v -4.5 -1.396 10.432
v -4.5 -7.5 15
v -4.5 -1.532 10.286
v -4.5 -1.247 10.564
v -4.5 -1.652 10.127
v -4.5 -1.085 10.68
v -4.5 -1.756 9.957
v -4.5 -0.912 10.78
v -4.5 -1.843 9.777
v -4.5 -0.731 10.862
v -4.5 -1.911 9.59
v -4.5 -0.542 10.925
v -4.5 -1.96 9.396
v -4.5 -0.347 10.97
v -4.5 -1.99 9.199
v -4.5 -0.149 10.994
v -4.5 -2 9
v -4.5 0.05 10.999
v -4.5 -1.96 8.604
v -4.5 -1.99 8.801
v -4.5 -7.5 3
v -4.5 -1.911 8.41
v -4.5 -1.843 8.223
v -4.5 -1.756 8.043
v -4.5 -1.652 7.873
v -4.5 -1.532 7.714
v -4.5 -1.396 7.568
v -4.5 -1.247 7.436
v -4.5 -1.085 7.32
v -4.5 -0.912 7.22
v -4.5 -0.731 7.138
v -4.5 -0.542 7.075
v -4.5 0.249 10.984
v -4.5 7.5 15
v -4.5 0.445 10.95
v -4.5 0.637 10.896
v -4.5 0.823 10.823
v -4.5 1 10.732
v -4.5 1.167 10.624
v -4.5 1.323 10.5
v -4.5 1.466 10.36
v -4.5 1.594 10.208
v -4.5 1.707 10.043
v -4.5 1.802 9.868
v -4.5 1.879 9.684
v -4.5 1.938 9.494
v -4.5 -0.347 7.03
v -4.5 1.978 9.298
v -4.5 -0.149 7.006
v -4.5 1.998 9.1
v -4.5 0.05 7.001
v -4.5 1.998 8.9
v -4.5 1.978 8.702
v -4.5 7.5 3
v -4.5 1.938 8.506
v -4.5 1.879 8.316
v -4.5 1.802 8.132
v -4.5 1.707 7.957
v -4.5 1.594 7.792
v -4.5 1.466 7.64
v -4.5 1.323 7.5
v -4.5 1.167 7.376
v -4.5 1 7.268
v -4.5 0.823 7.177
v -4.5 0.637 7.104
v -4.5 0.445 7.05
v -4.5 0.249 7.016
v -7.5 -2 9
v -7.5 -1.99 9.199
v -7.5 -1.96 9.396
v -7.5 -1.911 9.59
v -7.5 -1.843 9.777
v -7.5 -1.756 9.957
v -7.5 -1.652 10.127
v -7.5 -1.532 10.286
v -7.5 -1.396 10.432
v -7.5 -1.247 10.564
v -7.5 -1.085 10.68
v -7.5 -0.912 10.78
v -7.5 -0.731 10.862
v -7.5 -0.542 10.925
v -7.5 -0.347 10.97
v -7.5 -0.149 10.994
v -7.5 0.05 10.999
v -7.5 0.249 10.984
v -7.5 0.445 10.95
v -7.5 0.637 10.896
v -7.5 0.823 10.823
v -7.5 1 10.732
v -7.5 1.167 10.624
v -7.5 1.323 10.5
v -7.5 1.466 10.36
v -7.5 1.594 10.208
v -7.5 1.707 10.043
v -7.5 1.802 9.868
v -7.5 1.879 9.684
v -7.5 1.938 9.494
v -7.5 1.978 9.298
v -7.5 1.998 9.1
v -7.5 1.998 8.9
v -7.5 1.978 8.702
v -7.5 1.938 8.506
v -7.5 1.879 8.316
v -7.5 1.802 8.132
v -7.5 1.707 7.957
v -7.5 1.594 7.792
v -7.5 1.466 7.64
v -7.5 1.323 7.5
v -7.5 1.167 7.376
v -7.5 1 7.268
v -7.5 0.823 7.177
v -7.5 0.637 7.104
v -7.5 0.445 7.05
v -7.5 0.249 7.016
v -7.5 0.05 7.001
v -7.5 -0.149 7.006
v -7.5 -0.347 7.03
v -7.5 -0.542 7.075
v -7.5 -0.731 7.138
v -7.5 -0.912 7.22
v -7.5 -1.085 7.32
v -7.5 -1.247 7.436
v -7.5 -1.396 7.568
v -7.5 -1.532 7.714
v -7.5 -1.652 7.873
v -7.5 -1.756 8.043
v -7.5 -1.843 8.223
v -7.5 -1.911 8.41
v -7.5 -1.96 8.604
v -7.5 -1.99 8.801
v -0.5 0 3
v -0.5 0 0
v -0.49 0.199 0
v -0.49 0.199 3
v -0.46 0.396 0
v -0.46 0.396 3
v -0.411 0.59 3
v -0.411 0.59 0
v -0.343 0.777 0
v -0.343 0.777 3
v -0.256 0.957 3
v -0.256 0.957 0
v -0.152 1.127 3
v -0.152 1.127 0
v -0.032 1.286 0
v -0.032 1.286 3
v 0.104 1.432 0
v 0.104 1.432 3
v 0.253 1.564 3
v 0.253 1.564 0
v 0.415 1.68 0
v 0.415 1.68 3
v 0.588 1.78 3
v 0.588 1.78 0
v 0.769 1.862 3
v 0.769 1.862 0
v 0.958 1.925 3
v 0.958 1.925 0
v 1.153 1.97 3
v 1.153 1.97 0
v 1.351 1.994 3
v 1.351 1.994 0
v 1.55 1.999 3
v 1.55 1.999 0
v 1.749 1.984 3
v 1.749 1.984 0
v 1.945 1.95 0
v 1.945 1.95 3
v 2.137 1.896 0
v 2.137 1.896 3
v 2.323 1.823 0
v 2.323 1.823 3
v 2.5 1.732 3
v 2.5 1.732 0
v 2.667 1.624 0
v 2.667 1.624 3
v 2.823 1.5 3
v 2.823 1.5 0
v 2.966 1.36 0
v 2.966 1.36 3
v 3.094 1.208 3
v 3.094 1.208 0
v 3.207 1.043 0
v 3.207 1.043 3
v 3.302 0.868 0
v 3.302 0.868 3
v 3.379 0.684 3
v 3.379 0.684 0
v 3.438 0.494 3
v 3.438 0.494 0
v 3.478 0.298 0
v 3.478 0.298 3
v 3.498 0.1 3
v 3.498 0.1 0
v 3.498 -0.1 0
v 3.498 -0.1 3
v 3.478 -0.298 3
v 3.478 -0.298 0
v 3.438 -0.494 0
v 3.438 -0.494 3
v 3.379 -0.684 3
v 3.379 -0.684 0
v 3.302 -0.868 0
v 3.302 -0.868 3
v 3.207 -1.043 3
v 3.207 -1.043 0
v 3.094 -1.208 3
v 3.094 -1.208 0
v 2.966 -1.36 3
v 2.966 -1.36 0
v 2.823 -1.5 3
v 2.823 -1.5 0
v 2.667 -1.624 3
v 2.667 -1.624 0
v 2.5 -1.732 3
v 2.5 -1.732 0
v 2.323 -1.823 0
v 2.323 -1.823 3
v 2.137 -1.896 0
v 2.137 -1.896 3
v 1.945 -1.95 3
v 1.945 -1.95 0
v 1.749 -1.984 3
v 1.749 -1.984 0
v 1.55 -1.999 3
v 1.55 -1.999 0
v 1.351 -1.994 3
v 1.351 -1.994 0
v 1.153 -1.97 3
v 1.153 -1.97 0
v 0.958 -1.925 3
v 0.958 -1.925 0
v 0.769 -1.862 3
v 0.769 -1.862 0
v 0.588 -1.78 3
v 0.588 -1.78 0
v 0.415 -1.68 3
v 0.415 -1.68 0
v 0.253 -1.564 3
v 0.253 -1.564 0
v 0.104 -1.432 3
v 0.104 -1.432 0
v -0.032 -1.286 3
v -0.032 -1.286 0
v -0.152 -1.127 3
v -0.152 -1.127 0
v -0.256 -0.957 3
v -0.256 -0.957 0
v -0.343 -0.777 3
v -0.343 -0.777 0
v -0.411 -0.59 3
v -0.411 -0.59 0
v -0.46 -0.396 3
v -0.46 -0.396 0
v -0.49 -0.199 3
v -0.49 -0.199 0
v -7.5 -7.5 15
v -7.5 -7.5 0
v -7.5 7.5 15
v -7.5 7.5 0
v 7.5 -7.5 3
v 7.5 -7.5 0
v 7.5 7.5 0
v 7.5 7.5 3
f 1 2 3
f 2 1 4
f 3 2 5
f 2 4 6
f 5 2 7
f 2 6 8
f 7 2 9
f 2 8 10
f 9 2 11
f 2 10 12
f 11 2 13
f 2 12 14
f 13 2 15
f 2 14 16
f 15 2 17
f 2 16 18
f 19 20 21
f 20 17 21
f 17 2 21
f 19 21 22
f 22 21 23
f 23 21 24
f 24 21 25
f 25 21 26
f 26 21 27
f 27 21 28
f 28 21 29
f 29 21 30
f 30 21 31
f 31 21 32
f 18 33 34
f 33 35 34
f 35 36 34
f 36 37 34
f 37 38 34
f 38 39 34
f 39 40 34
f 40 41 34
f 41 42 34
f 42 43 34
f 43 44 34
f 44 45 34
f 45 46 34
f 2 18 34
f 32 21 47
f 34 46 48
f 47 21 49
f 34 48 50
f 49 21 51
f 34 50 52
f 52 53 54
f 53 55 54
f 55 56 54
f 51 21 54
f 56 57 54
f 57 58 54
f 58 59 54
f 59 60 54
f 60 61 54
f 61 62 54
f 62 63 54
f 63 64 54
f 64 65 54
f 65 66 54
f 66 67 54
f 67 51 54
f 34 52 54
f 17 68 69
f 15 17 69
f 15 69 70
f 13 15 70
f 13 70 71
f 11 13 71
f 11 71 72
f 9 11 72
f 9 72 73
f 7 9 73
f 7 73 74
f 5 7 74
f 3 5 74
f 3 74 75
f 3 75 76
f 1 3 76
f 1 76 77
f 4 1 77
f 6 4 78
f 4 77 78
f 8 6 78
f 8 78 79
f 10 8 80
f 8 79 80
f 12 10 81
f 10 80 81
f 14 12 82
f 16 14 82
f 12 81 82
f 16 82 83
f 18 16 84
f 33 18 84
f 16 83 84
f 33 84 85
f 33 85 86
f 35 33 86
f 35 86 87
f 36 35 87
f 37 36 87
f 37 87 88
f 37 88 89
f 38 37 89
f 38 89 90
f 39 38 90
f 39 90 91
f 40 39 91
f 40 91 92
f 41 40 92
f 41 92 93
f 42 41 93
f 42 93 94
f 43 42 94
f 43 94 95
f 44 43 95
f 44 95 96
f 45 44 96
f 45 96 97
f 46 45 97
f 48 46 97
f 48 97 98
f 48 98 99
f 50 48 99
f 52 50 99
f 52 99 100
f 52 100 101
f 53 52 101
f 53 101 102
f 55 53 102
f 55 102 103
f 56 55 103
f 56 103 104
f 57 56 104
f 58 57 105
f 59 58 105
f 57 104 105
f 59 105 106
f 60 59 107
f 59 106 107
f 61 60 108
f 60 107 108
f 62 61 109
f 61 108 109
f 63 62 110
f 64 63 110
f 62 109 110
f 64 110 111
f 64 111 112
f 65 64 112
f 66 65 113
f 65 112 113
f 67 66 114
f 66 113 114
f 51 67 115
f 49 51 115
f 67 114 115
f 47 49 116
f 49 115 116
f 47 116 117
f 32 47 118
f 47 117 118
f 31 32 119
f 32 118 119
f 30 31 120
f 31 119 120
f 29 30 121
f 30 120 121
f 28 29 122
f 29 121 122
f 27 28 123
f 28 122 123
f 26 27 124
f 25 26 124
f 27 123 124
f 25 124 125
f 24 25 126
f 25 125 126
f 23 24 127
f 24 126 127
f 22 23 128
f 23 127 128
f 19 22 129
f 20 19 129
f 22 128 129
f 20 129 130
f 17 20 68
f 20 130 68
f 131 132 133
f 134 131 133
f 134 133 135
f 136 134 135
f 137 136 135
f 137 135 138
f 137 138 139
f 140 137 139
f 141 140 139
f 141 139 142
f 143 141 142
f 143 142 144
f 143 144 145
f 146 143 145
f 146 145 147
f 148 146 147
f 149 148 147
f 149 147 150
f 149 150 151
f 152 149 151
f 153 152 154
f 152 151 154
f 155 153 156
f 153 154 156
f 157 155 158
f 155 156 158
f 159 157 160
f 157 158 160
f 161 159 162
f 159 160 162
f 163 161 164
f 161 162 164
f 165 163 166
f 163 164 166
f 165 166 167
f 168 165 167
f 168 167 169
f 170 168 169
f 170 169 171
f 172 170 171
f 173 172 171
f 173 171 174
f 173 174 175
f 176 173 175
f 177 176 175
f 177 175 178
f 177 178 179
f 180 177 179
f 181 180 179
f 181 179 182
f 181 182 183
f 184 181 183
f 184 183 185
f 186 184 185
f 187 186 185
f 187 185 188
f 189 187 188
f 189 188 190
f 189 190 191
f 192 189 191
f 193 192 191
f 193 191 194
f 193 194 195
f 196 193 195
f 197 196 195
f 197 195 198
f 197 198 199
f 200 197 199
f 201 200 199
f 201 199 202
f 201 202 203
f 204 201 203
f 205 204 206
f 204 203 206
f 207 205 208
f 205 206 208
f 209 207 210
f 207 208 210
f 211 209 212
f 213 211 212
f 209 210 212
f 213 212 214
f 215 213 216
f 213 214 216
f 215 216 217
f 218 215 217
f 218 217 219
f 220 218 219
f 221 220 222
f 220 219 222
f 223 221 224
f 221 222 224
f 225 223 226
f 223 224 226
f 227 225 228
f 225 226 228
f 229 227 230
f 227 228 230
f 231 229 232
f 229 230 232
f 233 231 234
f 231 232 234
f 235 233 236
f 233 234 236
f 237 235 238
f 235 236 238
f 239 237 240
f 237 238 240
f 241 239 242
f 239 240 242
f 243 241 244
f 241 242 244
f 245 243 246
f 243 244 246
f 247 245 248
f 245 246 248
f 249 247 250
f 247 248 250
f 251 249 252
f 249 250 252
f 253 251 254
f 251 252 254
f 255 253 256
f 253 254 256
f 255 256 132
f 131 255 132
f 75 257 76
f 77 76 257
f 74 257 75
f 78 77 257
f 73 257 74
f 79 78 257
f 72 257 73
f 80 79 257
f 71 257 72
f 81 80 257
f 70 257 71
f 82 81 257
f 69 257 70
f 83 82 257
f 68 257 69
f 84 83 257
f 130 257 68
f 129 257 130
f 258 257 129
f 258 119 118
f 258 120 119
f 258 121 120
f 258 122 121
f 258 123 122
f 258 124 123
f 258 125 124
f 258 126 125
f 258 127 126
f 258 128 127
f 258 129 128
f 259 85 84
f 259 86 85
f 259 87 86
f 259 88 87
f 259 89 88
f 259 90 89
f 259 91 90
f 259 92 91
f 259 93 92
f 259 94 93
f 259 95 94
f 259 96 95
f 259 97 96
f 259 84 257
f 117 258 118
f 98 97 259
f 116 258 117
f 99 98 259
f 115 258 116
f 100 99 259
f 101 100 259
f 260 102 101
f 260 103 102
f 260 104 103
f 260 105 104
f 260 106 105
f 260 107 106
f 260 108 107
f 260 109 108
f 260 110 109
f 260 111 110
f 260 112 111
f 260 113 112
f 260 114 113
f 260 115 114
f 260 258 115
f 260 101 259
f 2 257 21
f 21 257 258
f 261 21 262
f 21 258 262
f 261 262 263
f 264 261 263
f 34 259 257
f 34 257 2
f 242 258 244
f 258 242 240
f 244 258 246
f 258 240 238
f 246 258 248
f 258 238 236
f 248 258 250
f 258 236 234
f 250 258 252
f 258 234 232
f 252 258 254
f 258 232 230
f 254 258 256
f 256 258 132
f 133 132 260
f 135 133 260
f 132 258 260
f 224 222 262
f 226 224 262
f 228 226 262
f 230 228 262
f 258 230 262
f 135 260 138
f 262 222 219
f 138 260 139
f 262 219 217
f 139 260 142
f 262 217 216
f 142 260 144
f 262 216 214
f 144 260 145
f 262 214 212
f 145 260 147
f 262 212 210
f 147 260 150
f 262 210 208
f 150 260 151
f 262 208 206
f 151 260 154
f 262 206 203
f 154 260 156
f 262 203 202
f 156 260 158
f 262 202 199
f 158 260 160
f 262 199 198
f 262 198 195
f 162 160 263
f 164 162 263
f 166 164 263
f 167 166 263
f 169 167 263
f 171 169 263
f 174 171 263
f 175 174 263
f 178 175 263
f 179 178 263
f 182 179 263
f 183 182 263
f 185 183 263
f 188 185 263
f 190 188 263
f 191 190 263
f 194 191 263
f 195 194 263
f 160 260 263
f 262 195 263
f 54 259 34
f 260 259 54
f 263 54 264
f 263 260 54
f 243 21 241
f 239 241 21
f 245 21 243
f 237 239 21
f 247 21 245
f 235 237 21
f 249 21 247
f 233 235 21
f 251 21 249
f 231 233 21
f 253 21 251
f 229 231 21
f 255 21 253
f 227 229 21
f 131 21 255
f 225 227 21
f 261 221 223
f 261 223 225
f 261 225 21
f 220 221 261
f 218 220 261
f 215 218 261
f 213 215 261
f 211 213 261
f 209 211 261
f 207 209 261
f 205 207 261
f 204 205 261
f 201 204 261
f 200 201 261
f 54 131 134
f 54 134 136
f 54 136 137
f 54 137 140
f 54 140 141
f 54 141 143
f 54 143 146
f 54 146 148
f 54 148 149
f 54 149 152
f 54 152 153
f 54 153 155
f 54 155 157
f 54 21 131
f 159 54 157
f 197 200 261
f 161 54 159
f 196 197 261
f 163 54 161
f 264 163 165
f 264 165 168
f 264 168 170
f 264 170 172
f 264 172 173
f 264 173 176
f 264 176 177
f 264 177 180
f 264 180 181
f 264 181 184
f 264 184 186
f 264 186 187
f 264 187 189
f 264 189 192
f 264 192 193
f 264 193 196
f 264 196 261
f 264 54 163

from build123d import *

# Parameters (mm, degrees)
SKETCH1_W           = 15
SKETCH1_H           = 15
BOSS_EXTRUDE1_DEPTH = 3
SKETCH2_W           = 3
SKETCH2_H           = 15
BOSS_EXTRUDE2_DEPTH = 12
SKETCH3_R           = 2
CUT_EXTRUDE1_DEPTH  = 12
SKETCH4_R           = 2
CUT_EXTRUDE2_DEPTH  = 12


with BuildPart() as part:
    # Sketch1 → Boss-Extrude1 (new body)
    with BuildSketch(Plane.XY):
        Rectangle(SKETCH1_W, SKETCH1_H)
    extrude(amount=BOSS_EXTRUDE1_DEPTH)

    # Sketch2 → Boss-Extrude2 (add)
    with BuildSketch(Plane.XY.offset(3)):
        with Locations((-6, 0)):
            Rectangle(SKETCH2_W, SKETCH2_H)
    extrude(amount=BOSS_EXTRUDE2_DEPTH)

    # Sketch3 → Cut-Extrude1 (cut)
    with BuildSketch(Plane(origin=(0, 0, 0), x_dir=(-1, 0, 0), z_dir=(0, 0, -1))):
        with Locations((-1.5, 0)):
            Circle(SKETCH3_R)
    extrude(amount=-CUT_EXTRUDE1_DEPTH, mode=Mode.SUBTRACT)

    # Sketch4 → Cut-Extrude2 (cut)
    with BuildSketch(Plane.ZY.offset(7.5)):
        with Locations(Location((9, 0, 0), (0, 0, 270))):
            Circle(SKETCH4_R)
    extrude(amount=-CUT_EXTRUDE2_DEPTH, mode=Mode.SUBTRACT)


solid = part.part
